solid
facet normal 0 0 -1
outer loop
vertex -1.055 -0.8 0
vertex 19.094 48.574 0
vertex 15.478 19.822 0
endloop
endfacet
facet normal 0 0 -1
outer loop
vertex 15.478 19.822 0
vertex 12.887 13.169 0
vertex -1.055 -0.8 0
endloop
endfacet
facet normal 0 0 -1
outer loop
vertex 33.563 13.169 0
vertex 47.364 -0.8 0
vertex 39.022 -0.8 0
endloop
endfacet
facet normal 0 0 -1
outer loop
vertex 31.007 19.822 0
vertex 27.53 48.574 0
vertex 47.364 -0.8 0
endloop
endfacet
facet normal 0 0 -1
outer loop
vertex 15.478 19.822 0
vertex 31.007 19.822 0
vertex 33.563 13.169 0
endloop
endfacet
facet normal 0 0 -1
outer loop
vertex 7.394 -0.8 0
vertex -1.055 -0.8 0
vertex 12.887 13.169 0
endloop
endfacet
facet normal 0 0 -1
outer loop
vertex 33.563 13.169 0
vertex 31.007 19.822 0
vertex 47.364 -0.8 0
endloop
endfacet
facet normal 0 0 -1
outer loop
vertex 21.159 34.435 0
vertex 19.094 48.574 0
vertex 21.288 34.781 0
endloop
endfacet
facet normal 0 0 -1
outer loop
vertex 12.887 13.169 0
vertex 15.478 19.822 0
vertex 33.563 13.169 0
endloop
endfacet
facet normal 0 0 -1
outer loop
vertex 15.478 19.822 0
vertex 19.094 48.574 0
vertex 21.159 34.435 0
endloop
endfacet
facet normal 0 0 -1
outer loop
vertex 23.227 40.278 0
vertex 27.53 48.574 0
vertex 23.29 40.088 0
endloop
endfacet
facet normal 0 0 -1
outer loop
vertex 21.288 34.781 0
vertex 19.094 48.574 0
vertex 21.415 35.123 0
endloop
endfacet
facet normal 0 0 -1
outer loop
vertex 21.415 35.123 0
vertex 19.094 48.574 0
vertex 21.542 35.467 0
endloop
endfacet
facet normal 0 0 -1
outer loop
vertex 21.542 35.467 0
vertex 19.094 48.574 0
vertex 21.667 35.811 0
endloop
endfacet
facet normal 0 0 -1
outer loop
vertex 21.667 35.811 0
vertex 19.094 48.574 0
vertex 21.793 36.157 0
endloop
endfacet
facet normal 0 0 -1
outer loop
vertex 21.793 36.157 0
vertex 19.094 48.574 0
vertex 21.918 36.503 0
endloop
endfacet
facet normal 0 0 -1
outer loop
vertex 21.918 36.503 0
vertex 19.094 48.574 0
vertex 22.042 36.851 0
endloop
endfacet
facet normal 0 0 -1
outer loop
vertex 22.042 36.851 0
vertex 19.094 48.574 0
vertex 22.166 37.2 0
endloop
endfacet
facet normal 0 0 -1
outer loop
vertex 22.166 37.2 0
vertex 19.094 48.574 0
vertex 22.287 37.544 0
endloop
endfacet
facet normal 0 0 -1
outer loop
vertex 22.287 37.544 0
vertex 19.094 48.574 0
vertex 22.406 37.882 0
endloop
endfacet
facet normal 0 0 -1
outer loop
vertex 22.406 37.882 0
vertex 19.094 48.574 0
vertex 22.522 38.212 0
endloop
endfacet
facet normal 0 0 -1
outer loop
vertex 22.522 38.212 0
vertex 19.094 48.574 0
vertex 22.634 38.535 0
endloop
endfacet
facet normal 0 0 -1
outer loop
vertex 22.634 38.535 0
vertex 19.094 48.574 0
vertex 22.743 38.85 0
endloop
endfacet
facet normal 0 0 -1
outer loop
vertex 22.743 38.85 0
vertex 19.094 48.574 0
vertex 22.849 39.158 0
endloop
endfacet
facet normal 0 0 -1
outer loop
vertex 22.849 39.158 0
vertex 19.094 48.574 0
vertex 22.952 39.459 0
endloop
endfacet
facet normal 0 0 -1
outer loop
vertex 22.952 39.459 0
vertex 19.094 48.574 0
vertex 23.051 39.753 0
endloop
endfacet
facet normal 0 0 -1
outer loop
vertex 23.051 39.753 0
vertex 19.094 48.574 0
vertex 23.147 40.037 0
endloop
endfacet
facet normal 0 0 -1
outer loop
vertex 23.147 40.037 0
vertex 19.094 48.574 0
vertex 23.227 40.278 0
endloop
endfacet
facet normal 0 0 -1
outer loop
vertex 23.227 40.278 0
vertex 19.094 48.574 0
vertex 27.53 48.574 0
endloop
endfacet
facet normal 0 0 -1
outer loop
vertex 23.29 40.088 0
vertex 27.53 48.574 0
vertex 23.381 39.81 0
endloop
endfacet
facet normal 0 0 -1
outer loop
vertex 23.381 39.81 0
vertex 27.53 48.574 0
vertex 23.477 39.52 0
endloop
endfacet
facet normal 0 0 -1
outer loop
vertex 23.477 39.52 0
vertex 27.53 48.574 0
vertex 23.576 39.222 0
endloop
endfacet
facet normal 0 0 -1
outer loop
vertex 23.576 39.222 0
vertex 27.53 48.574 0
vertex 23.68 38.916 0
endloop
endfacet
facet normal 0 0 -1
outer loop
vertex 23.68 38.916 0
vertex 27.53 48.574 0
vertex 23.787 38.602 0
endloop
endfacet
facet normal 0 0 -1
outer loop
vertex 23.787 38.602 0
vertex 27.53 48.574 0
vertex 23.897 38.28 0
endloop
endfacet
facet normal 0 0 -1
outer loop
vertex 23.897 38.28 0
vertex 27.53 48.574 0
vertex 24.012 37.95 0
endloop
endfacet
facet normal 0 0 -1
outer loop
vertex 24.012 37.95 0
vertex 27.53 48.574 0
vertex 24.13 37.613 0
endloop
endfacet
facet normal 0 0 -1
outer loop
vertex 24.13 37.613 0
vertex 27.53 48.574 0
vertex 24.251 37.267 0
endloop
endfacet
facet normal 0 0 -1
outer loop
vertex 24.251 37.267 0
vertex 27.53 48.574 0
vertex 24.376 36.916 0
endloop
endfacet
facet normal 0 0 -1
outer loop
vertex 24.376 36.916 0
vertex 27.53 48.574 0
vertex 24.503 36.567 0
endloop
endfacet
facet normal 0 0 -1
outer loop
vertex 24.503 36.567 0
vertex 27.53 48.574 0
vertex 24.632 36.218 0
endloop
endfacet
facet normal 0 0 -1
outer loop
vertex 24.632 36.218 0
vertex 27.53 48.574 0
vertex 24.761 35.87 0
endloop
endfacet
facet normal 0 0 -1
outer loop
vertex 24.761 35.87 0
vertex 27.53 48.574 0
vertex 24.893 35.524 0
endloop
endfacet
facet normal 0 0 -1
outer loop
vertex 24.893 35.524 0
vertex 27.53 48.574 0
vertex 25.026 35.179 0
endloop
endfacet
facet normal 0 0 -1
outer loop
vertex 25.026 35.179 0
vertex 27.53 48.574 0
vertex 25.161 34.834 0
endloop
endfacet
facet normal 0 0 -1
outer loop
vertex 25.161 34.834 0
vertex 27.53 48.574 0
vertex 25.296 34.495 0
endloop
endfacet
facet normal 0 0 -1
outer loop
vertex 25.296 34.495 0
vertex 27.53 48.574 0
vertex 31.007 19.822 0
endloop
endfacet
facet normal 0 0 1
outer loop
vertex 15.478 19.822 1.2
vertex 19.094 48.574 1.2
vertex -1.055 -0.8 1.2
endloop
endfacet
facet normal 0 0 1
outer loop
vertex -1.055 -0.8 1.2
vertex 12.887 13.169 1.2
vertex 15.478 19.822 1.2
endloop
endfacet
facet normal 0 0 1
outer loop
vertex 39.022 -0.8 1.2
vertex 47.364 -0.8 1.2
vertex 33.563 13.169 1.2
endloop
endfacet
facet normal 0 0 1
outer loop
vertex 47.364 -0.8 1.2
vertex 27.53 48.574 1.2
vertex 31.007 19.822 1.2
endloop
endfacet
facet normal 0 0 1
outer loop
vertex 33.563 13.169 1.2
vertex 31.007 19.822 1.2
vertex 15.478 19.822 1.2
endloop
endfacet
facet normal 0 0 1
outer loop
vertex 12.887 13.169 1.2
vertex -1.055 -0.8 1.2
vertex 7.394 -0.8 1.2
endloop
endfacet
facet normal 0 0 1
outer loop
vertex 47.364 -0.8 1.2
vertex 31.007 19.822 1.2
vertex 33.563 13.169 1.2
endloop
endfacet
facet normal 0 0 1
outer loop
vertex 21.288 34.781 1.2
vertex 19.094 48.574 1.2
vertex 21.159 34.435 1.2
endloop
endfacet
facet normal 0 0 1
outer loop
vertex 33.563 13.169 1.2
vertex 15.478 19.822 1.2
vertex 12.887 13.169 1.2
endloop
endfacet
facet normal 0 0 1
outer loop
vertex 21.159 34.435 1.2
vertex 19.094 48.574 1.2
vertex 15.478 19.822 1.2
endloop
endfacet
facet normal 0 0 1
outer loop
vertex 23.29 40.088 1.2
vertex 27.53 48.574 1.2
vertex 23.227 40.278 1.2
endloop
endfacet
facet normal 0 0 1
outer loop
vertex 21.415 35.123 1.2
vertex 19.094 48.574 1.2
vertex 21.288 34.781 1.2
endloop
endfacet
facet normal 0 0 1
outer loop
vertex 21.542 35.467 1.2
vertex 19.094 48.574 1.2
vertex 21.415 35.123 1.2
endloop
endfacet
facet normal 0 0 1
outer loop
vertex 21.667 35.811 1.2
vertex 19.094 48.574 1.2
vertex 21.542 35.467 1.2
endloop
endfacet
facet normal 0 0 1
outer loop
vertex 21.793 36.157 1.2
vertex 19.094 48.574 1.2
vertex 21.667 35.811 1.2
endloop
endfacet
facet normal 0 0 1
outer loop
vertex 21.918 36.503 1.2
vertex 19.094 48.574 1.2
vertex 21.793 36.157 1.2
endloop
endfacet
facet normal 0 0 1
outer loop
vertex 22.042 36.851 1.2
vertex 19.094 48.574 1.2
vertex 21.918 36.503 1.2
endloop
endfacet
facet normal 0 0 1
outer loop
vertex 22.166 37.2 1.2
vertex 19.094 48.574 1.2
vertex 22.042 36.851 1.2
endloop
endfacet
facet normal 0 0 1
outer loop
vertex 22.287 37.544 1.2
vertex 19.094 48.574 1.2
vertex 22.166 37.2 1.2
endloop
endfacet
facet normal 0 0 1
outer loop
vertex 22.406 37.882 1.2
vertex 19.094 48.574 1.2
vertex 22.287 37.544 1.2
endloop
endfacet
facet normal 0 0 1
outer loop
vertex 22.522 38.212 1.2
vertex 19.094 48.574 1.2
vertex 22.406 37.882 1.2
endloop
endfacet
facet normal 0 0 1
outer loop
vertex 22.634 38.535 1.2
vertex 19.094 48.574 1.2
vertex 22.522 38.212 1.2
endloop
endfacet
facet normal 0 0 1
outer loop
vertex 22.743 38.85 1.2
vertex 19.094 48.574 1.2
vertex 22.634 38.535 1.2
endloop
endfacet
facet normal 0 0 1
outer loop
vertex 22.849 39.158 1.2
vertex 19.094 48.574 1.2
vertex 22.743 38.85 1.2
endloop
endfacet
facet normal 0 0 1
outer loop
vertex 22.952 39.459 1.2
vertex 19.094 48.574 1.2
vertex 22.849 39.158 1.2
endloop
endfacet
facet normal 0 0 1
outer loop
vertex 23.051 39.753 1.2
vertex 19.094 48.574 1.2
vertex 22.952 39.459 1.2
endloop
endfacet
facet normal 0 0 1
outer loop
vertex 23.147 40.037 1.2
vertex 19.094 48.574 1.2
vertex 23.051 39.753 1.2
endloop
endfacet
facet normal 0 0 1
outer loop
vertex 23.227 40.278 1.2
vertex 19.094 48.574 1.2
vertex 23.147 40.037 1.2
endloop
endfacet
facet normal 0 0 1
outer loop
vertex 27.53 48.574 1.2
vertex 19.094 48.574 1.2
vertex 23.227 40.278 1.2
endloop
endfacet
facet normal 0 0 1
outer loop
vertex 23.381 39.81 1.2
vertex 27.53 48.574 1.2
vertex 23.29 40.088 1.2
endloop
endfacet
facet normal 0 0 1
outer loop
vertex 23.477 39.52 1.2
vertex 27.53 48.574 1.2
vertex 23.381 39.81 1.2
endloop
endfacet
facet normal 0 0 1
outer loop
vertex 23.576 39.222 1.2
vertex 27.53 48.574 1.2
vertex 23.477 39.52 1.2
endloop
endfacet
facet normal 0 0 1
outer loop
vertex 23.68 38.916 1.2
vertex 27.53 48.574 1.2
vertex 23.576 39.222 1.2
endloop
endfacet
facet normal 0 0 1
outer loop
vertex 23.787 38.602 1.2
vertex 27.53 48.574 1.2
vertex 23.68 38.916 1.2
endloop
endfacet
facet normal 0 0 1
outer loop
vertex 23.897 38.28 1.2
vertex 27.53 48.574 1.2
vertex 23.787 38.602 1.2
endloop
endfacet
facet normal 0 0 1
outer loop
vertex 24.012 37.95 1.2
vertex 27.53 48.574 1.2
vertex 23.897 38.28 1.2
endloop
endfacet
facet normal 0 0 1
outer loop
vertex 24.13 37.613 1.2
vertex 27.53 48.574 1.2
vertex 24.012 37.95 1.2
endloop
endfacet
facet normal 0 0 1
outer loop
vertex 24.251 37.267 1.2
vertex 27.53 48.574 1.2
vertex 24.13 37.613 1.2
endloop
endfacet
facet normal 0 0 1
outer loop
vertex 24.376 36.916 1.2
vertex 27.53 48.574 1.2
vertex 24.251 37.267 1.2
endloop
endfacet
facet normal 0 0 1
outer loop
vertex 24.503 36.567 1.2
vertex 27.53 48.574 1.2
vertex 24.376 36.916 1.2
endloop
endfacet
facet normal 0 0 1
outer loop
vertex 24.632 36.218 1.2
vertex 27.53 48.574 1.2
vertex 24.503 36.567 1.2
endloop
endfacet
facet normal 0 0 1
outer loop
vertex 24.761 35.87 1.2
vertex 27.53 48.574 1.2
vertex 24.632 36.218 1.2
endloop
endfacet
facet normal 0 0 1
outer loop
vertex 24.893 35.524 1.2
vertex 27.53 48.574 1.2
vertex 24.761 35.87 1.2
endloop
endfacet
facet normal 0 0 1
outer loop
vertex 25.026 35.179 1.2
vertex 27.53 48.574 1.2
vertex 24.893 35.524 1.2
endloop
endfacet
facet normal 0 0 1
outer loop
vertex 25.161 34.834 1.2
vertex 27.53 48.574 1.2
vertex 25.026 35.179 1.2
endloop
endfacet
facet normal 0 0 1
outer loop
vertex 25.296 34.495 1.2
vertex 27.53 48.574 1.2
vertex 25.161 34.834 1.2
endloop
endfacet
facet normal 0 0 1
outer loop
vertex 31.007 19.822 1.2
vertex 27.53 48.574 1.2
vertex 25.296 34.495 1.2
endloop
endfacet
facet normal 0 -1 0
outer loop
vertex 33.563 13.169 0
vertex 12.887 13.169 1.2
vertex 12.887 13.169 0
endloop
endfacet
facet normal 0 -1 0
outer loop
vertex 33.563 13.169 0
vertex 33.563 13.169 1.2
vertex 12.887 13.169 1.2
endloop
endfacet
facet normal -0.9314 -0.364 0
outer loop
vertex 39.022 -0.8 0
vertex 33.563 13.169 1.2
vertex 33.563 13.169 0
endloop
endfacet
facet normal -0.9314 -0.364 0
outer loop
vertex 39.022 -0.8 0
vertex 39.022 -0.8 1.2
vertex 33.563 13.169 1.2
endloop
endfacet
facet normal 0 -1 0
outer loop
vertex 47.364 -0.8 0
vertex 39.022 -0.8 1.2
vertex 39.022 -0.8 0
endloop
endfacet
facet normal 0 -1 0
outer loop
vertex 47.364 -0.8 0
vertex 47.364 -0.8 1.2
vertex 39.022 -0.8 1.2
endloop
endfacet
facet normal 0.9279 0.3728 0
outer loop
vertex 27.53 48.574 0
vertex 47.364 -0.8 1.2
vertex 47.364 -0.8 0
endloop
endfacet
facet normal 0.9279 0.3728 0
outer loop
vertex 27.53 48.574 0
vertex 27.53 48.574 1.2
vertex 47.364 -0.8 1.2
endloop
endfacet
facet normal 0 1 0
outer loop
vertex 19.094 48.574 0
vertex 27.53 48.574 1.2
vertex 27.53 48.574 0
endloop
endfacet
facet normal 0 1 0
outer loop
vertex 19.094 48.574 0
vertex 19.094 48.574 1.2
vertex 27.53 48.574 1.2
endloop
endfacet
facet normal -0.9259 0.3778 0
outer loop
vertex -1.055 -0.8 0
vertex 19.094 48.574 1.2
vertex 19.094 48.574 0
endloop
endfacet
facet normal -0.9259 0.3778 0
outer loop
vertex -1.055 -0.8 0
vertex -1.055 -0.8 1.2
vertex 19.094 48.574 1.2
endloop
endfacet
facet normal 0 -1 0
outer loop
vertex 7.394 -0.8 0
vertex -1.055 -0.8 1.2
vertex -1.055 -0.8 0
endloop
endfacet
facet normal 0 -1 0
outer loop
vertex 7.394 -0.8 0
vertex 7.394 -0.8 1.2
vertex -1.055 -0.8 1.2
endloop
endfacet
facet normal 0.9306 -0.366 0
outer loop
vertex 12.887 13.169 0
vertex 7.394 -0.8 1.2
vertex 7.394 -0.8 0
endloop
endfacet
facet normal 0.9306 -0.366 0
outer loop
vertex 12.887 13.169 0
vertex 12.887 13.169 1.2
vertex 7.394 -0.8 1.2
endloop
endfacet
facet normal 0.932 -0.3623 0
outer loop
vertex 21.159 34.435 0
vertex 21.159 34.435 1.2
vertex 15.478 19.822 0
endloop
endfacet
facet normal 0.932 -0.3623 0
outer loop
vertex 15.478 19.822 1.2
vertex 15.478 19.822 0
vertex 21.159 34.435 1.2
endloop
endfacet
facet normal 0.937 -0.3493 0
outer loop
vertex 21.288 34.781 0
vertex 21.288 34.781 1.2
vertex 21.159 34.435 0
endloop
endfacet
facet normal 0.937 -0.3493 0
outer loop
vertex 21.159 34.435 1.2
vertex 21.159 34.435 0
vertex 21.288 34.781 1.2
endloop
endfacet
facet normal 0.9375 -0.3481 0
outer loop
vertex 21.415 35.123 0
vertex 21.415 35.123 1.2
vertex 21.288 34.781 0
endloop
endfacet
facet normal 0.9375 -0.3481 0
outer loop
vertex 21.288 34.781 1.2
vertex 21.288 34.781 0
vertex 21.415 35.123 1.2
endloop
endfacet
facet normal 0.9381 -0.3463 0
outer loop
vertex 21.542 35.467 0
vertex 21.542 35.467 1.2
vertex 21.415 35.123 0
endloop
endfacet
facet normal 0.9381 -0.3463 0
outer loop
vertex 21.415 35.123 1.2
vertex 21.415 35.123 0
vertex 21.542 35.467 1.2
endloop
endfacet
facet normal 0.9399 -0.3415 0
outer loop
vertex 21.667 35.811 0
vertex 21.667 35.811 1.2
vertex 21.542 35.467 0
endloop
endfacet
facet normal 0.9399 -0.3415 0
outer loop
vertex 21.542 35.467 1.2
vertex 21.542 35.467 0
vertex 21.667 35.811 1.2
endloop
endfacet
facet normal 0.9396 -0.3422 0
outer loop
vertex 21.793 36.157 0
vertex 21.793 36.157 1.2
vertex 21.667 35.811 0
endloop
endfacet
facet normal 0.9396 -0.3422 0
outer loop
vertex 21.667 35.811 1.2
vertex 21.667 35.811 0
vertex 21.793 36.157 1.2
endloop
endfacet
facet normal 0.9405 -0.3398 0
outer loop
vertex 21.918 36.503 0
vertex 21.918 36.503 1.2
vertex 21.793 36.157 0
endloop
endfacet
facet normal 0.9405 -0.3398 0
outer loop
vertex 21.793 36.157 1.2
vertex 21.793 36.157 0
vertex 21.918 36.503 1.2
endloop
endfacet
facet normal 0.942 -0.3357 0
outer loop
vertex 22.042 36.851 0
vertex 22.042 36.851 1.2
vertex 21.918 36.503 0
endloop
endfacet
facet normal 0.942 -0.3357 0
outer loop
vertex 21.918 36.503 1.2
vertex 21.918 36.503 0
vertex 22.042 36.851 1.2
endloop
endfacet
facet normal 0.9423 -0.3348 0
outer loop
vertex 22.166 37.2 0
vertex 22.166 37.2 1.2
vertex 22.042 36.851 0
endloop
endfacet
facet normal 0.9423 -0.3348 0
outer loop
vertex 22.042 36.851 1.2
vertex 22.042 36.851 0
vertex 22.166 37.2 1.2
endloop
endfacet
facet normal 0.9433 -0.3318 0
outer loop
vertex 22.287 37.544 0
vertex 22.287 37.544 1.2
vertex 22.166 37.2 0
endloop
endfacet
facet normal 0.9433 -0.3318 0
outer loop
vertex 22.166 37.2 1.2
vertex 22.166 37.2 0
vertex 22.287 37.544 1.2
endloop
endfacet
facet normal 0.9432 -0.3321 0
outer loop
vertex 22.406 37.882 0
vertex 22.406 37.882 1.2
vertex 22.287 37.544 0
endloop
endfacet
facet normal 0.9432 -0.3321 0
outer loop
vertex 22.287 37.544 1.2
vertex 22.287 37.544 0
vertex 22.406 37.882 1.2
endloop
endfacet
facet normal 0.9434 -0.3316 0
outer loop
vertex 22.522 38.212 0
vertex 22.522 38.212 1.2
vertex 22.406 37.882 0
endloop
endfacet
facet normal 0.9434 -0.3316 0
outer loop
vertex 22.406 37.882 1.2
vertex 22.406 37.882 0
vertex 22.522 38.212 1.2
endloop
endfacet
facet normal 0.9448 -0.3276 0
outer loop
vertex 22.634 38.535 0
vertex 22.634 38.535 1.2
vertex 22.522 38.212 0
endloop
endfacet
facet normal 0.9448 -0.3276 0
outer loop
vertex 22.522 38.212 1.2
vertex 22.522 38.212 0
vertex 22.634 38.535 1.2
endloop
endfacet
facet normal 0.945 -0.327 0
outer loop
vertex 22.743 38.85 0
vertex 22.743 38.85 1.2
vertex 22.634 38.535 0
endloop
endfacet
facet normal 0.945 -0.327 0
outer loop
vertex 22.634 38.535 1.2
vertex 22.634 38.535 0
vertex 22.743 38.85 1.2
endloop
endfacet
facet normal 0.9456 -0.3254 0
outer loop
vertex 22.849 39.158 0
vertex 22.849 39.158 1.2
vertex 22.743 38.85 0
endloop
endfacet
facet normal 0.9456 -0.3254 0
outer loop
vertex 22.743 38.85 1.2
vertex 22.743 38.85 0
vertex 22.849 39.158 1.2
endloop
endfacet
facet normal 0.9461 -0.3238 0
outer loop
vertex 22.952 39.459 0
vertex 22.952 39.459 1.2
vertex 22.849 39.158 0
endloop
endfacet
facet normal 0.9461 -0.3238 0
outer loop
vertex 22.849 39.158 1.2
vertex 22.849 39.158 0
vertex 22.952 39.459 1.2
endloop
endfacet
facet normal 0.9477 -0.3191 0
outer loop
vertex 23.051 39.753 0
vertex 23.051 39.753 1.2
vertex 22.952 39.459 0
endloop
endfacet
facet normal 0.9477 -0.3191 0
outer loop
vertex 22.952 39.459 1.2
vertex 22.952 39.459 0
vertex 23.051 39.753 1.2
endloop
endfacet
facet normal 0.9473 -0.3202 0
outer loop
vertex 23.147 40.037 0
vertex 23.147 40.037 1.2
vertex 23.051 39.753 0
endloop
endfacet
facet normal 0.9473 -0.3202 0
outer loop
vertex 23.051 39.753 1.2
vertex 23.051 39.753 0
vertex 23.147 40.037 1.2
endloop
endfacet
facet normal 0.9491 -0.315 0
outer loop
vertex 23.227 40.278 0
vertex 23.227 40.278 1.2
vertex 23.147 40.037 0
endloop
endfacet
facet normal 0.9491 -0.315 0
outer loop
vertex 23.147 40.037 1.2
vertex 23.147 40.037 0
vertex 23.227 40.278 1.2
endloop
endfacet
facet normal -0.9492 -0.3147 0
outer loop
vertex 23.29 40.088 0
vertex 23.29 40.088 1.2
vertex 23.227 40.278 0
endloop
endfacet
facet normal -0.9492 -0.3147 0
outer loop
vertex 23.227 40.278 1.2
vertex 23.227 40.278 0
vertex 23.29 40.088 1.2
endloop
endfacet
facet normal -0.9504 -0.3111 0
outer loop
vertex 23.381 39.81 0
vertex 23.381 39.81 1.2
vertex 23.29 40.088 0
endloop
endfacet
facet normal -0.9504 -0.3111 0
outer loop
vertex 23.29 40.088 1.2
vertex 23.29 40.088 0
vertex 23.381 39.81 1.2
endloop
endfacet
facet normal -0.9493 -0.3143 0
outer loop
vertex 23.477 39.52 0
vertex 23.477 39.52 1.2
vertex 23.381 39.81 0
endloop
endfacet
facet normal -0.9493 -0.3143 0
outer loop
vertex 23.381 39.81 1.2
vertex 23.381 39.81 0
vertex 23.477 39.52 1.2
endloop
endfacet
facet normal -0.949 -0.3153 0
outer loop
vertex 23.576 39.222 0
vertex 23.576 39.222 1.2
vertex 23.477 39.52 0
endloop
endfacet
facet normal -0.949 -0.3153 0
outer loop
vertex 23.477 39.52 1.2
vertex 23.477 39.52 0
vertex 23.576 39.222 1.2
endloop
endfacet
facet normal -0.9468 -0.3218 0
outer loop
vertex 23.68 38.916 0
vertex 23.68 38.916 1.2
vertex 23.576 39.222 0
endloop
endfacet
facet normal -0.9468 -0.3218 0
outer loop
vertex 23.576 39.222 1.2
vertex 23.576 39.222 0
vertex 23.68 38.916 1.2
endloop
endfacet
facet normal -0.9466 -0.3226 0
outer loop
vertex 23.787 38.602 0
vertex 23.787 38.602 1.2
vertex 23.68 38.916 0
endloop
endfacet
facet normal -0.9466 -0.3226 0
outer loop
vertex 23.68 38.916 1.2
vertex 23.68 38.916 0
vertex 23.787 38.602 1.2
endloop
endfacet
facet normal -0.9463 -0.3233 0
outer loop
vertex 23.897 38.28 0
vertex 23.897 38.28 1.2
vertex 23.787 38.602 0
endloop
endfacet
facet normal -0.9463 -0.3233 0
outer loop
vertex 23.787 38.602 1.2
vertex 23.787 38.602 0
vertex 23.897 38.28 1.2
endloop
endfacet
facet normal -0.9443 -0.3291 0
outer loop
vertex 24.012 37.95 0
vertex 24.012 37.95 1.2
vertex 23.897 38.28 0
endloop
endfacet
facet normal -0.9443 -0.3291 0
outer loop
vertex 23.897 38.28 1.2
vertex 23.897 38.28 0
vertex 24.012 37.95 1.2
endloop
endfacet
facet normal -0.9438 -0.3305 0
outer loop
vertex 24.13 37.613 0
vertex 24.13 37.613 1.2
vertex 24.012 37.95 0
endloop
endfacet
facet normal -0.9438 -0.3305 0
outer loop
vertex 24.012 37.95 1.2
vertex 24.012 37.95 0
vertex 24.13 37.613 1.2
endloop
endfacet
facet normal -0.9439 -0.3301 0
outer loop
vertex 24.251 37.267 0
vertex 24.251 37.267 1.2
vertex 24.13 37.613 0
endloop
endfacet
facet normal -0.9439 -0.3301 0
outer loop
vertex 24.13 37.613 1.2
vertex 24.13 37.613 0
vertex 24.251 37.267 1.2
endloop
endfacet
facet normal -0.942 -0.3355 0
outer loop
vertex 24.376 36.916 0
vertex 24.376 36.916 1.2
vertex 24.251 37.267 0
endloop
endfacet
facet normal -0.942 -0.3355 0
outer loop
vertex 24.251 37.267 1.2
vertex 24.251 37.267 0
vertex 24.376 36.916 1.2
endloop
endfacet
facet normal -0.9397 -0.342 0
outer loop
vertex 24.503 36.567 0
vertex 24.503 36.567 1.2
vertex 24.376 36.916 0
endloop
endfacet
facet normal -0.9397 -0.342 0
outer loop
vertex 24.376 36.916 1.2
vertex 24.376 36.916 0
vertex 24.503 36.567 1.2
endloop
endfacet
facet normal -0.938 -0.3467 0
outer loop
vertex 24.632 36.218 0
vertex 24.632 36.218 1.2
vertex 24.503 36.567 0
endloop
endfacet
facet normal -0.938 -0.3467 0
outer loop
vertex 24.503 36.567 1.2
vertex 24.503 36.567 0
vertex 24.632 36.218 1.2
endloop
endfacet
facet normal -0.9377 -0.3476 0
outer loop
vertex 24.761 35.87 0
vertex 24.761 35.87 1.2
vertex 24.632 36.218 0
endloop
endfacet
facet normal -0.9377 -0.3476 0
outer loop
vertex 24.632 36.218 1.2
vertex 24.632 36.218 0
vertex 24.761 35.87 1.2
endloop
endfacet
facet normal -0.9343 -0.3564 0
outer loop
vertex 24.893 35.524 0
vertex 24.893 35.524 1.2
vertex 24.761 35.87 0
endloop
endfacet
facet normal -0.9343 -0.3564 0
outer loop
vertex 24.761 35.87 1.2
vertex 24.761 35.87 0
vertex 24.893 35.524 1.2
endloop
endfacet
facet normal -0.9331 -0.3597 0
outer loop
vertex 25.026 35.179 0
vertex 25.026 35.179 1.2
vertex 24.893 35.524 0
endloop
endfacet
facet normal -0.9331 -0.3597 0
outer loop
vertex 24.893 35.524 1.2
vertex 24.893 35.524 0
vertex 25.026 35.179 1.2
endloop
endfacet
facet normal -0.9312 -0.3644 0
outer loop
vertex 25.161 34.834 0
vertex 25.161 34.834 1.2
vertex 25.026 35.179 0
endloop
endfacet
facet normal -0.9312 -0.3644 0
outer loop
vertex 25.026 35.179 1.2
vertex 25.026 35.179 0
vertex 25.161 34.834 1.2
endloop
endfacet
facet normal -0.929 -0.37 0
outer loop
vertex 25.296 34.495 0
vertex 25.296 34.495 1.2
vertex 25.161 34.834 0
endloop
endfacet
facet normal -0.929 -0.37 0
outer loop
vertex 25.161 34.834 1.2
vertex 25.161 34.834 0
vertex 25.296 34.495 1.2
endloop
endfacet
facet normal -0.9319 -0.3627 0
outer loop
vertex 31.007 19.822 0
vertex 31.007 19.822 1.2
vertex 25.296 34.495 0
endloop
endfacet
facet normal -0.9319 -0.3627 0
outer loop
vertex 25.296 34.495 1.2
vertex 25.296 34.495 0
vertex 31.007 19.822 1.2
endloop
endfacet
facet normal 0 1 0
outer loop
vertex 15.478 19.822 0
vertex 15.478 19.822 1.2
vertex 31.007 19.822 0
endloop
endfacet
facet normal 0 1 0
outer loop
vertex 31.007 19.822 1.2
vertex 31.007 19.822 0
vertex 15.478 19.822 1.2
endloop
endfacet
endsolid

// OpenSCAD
// file: include/signmaker.scad
// OpenSCAD LED signmaker
// to be included in own OpenSCAD scripts
// inspired by bigclivelive stream 2022-06-11

module signbody(h=10, ww=2.4, fl=1.2, fh=1.2) {
    difference() {
        linear_extrude(height=h)
            offset(delta=ww)
                children();
        translate([0,0,fl])
            linear_extrude(height=h)
                children();
        translate([0,0,h-fh])	
            linear_extrude(height=h)
                offset(delta=ww/2)
                    children();
    }
}

module signface(ww=2.4, fh=1.2, pl=0.2) {
    linear_extrude(height=fh)
        offset(delta=ww/2-pl)
            children();
}
// main file
// OpenSCAD sign maker (sign front face)
//
// Inspried by script in description of
// BigClive's livestream from 2022-06-11.
//
// Select the font name from the list of available fonts:
// Menu: "Help" > "Font List"
//

//Text to render
text="A";

//Font to use
font="Arial";

//Text size
size=50;

//Wall width
ww=2;

//Face depth
fh=1.2;

//Play for fitting face
pl=0.2;

///////////////////////////
$fn=60;

include <include/signmaker.scad>;

signface(ww=ww, fh=fh, pl=pl) {
    text(text, font=font, size=size);
}
